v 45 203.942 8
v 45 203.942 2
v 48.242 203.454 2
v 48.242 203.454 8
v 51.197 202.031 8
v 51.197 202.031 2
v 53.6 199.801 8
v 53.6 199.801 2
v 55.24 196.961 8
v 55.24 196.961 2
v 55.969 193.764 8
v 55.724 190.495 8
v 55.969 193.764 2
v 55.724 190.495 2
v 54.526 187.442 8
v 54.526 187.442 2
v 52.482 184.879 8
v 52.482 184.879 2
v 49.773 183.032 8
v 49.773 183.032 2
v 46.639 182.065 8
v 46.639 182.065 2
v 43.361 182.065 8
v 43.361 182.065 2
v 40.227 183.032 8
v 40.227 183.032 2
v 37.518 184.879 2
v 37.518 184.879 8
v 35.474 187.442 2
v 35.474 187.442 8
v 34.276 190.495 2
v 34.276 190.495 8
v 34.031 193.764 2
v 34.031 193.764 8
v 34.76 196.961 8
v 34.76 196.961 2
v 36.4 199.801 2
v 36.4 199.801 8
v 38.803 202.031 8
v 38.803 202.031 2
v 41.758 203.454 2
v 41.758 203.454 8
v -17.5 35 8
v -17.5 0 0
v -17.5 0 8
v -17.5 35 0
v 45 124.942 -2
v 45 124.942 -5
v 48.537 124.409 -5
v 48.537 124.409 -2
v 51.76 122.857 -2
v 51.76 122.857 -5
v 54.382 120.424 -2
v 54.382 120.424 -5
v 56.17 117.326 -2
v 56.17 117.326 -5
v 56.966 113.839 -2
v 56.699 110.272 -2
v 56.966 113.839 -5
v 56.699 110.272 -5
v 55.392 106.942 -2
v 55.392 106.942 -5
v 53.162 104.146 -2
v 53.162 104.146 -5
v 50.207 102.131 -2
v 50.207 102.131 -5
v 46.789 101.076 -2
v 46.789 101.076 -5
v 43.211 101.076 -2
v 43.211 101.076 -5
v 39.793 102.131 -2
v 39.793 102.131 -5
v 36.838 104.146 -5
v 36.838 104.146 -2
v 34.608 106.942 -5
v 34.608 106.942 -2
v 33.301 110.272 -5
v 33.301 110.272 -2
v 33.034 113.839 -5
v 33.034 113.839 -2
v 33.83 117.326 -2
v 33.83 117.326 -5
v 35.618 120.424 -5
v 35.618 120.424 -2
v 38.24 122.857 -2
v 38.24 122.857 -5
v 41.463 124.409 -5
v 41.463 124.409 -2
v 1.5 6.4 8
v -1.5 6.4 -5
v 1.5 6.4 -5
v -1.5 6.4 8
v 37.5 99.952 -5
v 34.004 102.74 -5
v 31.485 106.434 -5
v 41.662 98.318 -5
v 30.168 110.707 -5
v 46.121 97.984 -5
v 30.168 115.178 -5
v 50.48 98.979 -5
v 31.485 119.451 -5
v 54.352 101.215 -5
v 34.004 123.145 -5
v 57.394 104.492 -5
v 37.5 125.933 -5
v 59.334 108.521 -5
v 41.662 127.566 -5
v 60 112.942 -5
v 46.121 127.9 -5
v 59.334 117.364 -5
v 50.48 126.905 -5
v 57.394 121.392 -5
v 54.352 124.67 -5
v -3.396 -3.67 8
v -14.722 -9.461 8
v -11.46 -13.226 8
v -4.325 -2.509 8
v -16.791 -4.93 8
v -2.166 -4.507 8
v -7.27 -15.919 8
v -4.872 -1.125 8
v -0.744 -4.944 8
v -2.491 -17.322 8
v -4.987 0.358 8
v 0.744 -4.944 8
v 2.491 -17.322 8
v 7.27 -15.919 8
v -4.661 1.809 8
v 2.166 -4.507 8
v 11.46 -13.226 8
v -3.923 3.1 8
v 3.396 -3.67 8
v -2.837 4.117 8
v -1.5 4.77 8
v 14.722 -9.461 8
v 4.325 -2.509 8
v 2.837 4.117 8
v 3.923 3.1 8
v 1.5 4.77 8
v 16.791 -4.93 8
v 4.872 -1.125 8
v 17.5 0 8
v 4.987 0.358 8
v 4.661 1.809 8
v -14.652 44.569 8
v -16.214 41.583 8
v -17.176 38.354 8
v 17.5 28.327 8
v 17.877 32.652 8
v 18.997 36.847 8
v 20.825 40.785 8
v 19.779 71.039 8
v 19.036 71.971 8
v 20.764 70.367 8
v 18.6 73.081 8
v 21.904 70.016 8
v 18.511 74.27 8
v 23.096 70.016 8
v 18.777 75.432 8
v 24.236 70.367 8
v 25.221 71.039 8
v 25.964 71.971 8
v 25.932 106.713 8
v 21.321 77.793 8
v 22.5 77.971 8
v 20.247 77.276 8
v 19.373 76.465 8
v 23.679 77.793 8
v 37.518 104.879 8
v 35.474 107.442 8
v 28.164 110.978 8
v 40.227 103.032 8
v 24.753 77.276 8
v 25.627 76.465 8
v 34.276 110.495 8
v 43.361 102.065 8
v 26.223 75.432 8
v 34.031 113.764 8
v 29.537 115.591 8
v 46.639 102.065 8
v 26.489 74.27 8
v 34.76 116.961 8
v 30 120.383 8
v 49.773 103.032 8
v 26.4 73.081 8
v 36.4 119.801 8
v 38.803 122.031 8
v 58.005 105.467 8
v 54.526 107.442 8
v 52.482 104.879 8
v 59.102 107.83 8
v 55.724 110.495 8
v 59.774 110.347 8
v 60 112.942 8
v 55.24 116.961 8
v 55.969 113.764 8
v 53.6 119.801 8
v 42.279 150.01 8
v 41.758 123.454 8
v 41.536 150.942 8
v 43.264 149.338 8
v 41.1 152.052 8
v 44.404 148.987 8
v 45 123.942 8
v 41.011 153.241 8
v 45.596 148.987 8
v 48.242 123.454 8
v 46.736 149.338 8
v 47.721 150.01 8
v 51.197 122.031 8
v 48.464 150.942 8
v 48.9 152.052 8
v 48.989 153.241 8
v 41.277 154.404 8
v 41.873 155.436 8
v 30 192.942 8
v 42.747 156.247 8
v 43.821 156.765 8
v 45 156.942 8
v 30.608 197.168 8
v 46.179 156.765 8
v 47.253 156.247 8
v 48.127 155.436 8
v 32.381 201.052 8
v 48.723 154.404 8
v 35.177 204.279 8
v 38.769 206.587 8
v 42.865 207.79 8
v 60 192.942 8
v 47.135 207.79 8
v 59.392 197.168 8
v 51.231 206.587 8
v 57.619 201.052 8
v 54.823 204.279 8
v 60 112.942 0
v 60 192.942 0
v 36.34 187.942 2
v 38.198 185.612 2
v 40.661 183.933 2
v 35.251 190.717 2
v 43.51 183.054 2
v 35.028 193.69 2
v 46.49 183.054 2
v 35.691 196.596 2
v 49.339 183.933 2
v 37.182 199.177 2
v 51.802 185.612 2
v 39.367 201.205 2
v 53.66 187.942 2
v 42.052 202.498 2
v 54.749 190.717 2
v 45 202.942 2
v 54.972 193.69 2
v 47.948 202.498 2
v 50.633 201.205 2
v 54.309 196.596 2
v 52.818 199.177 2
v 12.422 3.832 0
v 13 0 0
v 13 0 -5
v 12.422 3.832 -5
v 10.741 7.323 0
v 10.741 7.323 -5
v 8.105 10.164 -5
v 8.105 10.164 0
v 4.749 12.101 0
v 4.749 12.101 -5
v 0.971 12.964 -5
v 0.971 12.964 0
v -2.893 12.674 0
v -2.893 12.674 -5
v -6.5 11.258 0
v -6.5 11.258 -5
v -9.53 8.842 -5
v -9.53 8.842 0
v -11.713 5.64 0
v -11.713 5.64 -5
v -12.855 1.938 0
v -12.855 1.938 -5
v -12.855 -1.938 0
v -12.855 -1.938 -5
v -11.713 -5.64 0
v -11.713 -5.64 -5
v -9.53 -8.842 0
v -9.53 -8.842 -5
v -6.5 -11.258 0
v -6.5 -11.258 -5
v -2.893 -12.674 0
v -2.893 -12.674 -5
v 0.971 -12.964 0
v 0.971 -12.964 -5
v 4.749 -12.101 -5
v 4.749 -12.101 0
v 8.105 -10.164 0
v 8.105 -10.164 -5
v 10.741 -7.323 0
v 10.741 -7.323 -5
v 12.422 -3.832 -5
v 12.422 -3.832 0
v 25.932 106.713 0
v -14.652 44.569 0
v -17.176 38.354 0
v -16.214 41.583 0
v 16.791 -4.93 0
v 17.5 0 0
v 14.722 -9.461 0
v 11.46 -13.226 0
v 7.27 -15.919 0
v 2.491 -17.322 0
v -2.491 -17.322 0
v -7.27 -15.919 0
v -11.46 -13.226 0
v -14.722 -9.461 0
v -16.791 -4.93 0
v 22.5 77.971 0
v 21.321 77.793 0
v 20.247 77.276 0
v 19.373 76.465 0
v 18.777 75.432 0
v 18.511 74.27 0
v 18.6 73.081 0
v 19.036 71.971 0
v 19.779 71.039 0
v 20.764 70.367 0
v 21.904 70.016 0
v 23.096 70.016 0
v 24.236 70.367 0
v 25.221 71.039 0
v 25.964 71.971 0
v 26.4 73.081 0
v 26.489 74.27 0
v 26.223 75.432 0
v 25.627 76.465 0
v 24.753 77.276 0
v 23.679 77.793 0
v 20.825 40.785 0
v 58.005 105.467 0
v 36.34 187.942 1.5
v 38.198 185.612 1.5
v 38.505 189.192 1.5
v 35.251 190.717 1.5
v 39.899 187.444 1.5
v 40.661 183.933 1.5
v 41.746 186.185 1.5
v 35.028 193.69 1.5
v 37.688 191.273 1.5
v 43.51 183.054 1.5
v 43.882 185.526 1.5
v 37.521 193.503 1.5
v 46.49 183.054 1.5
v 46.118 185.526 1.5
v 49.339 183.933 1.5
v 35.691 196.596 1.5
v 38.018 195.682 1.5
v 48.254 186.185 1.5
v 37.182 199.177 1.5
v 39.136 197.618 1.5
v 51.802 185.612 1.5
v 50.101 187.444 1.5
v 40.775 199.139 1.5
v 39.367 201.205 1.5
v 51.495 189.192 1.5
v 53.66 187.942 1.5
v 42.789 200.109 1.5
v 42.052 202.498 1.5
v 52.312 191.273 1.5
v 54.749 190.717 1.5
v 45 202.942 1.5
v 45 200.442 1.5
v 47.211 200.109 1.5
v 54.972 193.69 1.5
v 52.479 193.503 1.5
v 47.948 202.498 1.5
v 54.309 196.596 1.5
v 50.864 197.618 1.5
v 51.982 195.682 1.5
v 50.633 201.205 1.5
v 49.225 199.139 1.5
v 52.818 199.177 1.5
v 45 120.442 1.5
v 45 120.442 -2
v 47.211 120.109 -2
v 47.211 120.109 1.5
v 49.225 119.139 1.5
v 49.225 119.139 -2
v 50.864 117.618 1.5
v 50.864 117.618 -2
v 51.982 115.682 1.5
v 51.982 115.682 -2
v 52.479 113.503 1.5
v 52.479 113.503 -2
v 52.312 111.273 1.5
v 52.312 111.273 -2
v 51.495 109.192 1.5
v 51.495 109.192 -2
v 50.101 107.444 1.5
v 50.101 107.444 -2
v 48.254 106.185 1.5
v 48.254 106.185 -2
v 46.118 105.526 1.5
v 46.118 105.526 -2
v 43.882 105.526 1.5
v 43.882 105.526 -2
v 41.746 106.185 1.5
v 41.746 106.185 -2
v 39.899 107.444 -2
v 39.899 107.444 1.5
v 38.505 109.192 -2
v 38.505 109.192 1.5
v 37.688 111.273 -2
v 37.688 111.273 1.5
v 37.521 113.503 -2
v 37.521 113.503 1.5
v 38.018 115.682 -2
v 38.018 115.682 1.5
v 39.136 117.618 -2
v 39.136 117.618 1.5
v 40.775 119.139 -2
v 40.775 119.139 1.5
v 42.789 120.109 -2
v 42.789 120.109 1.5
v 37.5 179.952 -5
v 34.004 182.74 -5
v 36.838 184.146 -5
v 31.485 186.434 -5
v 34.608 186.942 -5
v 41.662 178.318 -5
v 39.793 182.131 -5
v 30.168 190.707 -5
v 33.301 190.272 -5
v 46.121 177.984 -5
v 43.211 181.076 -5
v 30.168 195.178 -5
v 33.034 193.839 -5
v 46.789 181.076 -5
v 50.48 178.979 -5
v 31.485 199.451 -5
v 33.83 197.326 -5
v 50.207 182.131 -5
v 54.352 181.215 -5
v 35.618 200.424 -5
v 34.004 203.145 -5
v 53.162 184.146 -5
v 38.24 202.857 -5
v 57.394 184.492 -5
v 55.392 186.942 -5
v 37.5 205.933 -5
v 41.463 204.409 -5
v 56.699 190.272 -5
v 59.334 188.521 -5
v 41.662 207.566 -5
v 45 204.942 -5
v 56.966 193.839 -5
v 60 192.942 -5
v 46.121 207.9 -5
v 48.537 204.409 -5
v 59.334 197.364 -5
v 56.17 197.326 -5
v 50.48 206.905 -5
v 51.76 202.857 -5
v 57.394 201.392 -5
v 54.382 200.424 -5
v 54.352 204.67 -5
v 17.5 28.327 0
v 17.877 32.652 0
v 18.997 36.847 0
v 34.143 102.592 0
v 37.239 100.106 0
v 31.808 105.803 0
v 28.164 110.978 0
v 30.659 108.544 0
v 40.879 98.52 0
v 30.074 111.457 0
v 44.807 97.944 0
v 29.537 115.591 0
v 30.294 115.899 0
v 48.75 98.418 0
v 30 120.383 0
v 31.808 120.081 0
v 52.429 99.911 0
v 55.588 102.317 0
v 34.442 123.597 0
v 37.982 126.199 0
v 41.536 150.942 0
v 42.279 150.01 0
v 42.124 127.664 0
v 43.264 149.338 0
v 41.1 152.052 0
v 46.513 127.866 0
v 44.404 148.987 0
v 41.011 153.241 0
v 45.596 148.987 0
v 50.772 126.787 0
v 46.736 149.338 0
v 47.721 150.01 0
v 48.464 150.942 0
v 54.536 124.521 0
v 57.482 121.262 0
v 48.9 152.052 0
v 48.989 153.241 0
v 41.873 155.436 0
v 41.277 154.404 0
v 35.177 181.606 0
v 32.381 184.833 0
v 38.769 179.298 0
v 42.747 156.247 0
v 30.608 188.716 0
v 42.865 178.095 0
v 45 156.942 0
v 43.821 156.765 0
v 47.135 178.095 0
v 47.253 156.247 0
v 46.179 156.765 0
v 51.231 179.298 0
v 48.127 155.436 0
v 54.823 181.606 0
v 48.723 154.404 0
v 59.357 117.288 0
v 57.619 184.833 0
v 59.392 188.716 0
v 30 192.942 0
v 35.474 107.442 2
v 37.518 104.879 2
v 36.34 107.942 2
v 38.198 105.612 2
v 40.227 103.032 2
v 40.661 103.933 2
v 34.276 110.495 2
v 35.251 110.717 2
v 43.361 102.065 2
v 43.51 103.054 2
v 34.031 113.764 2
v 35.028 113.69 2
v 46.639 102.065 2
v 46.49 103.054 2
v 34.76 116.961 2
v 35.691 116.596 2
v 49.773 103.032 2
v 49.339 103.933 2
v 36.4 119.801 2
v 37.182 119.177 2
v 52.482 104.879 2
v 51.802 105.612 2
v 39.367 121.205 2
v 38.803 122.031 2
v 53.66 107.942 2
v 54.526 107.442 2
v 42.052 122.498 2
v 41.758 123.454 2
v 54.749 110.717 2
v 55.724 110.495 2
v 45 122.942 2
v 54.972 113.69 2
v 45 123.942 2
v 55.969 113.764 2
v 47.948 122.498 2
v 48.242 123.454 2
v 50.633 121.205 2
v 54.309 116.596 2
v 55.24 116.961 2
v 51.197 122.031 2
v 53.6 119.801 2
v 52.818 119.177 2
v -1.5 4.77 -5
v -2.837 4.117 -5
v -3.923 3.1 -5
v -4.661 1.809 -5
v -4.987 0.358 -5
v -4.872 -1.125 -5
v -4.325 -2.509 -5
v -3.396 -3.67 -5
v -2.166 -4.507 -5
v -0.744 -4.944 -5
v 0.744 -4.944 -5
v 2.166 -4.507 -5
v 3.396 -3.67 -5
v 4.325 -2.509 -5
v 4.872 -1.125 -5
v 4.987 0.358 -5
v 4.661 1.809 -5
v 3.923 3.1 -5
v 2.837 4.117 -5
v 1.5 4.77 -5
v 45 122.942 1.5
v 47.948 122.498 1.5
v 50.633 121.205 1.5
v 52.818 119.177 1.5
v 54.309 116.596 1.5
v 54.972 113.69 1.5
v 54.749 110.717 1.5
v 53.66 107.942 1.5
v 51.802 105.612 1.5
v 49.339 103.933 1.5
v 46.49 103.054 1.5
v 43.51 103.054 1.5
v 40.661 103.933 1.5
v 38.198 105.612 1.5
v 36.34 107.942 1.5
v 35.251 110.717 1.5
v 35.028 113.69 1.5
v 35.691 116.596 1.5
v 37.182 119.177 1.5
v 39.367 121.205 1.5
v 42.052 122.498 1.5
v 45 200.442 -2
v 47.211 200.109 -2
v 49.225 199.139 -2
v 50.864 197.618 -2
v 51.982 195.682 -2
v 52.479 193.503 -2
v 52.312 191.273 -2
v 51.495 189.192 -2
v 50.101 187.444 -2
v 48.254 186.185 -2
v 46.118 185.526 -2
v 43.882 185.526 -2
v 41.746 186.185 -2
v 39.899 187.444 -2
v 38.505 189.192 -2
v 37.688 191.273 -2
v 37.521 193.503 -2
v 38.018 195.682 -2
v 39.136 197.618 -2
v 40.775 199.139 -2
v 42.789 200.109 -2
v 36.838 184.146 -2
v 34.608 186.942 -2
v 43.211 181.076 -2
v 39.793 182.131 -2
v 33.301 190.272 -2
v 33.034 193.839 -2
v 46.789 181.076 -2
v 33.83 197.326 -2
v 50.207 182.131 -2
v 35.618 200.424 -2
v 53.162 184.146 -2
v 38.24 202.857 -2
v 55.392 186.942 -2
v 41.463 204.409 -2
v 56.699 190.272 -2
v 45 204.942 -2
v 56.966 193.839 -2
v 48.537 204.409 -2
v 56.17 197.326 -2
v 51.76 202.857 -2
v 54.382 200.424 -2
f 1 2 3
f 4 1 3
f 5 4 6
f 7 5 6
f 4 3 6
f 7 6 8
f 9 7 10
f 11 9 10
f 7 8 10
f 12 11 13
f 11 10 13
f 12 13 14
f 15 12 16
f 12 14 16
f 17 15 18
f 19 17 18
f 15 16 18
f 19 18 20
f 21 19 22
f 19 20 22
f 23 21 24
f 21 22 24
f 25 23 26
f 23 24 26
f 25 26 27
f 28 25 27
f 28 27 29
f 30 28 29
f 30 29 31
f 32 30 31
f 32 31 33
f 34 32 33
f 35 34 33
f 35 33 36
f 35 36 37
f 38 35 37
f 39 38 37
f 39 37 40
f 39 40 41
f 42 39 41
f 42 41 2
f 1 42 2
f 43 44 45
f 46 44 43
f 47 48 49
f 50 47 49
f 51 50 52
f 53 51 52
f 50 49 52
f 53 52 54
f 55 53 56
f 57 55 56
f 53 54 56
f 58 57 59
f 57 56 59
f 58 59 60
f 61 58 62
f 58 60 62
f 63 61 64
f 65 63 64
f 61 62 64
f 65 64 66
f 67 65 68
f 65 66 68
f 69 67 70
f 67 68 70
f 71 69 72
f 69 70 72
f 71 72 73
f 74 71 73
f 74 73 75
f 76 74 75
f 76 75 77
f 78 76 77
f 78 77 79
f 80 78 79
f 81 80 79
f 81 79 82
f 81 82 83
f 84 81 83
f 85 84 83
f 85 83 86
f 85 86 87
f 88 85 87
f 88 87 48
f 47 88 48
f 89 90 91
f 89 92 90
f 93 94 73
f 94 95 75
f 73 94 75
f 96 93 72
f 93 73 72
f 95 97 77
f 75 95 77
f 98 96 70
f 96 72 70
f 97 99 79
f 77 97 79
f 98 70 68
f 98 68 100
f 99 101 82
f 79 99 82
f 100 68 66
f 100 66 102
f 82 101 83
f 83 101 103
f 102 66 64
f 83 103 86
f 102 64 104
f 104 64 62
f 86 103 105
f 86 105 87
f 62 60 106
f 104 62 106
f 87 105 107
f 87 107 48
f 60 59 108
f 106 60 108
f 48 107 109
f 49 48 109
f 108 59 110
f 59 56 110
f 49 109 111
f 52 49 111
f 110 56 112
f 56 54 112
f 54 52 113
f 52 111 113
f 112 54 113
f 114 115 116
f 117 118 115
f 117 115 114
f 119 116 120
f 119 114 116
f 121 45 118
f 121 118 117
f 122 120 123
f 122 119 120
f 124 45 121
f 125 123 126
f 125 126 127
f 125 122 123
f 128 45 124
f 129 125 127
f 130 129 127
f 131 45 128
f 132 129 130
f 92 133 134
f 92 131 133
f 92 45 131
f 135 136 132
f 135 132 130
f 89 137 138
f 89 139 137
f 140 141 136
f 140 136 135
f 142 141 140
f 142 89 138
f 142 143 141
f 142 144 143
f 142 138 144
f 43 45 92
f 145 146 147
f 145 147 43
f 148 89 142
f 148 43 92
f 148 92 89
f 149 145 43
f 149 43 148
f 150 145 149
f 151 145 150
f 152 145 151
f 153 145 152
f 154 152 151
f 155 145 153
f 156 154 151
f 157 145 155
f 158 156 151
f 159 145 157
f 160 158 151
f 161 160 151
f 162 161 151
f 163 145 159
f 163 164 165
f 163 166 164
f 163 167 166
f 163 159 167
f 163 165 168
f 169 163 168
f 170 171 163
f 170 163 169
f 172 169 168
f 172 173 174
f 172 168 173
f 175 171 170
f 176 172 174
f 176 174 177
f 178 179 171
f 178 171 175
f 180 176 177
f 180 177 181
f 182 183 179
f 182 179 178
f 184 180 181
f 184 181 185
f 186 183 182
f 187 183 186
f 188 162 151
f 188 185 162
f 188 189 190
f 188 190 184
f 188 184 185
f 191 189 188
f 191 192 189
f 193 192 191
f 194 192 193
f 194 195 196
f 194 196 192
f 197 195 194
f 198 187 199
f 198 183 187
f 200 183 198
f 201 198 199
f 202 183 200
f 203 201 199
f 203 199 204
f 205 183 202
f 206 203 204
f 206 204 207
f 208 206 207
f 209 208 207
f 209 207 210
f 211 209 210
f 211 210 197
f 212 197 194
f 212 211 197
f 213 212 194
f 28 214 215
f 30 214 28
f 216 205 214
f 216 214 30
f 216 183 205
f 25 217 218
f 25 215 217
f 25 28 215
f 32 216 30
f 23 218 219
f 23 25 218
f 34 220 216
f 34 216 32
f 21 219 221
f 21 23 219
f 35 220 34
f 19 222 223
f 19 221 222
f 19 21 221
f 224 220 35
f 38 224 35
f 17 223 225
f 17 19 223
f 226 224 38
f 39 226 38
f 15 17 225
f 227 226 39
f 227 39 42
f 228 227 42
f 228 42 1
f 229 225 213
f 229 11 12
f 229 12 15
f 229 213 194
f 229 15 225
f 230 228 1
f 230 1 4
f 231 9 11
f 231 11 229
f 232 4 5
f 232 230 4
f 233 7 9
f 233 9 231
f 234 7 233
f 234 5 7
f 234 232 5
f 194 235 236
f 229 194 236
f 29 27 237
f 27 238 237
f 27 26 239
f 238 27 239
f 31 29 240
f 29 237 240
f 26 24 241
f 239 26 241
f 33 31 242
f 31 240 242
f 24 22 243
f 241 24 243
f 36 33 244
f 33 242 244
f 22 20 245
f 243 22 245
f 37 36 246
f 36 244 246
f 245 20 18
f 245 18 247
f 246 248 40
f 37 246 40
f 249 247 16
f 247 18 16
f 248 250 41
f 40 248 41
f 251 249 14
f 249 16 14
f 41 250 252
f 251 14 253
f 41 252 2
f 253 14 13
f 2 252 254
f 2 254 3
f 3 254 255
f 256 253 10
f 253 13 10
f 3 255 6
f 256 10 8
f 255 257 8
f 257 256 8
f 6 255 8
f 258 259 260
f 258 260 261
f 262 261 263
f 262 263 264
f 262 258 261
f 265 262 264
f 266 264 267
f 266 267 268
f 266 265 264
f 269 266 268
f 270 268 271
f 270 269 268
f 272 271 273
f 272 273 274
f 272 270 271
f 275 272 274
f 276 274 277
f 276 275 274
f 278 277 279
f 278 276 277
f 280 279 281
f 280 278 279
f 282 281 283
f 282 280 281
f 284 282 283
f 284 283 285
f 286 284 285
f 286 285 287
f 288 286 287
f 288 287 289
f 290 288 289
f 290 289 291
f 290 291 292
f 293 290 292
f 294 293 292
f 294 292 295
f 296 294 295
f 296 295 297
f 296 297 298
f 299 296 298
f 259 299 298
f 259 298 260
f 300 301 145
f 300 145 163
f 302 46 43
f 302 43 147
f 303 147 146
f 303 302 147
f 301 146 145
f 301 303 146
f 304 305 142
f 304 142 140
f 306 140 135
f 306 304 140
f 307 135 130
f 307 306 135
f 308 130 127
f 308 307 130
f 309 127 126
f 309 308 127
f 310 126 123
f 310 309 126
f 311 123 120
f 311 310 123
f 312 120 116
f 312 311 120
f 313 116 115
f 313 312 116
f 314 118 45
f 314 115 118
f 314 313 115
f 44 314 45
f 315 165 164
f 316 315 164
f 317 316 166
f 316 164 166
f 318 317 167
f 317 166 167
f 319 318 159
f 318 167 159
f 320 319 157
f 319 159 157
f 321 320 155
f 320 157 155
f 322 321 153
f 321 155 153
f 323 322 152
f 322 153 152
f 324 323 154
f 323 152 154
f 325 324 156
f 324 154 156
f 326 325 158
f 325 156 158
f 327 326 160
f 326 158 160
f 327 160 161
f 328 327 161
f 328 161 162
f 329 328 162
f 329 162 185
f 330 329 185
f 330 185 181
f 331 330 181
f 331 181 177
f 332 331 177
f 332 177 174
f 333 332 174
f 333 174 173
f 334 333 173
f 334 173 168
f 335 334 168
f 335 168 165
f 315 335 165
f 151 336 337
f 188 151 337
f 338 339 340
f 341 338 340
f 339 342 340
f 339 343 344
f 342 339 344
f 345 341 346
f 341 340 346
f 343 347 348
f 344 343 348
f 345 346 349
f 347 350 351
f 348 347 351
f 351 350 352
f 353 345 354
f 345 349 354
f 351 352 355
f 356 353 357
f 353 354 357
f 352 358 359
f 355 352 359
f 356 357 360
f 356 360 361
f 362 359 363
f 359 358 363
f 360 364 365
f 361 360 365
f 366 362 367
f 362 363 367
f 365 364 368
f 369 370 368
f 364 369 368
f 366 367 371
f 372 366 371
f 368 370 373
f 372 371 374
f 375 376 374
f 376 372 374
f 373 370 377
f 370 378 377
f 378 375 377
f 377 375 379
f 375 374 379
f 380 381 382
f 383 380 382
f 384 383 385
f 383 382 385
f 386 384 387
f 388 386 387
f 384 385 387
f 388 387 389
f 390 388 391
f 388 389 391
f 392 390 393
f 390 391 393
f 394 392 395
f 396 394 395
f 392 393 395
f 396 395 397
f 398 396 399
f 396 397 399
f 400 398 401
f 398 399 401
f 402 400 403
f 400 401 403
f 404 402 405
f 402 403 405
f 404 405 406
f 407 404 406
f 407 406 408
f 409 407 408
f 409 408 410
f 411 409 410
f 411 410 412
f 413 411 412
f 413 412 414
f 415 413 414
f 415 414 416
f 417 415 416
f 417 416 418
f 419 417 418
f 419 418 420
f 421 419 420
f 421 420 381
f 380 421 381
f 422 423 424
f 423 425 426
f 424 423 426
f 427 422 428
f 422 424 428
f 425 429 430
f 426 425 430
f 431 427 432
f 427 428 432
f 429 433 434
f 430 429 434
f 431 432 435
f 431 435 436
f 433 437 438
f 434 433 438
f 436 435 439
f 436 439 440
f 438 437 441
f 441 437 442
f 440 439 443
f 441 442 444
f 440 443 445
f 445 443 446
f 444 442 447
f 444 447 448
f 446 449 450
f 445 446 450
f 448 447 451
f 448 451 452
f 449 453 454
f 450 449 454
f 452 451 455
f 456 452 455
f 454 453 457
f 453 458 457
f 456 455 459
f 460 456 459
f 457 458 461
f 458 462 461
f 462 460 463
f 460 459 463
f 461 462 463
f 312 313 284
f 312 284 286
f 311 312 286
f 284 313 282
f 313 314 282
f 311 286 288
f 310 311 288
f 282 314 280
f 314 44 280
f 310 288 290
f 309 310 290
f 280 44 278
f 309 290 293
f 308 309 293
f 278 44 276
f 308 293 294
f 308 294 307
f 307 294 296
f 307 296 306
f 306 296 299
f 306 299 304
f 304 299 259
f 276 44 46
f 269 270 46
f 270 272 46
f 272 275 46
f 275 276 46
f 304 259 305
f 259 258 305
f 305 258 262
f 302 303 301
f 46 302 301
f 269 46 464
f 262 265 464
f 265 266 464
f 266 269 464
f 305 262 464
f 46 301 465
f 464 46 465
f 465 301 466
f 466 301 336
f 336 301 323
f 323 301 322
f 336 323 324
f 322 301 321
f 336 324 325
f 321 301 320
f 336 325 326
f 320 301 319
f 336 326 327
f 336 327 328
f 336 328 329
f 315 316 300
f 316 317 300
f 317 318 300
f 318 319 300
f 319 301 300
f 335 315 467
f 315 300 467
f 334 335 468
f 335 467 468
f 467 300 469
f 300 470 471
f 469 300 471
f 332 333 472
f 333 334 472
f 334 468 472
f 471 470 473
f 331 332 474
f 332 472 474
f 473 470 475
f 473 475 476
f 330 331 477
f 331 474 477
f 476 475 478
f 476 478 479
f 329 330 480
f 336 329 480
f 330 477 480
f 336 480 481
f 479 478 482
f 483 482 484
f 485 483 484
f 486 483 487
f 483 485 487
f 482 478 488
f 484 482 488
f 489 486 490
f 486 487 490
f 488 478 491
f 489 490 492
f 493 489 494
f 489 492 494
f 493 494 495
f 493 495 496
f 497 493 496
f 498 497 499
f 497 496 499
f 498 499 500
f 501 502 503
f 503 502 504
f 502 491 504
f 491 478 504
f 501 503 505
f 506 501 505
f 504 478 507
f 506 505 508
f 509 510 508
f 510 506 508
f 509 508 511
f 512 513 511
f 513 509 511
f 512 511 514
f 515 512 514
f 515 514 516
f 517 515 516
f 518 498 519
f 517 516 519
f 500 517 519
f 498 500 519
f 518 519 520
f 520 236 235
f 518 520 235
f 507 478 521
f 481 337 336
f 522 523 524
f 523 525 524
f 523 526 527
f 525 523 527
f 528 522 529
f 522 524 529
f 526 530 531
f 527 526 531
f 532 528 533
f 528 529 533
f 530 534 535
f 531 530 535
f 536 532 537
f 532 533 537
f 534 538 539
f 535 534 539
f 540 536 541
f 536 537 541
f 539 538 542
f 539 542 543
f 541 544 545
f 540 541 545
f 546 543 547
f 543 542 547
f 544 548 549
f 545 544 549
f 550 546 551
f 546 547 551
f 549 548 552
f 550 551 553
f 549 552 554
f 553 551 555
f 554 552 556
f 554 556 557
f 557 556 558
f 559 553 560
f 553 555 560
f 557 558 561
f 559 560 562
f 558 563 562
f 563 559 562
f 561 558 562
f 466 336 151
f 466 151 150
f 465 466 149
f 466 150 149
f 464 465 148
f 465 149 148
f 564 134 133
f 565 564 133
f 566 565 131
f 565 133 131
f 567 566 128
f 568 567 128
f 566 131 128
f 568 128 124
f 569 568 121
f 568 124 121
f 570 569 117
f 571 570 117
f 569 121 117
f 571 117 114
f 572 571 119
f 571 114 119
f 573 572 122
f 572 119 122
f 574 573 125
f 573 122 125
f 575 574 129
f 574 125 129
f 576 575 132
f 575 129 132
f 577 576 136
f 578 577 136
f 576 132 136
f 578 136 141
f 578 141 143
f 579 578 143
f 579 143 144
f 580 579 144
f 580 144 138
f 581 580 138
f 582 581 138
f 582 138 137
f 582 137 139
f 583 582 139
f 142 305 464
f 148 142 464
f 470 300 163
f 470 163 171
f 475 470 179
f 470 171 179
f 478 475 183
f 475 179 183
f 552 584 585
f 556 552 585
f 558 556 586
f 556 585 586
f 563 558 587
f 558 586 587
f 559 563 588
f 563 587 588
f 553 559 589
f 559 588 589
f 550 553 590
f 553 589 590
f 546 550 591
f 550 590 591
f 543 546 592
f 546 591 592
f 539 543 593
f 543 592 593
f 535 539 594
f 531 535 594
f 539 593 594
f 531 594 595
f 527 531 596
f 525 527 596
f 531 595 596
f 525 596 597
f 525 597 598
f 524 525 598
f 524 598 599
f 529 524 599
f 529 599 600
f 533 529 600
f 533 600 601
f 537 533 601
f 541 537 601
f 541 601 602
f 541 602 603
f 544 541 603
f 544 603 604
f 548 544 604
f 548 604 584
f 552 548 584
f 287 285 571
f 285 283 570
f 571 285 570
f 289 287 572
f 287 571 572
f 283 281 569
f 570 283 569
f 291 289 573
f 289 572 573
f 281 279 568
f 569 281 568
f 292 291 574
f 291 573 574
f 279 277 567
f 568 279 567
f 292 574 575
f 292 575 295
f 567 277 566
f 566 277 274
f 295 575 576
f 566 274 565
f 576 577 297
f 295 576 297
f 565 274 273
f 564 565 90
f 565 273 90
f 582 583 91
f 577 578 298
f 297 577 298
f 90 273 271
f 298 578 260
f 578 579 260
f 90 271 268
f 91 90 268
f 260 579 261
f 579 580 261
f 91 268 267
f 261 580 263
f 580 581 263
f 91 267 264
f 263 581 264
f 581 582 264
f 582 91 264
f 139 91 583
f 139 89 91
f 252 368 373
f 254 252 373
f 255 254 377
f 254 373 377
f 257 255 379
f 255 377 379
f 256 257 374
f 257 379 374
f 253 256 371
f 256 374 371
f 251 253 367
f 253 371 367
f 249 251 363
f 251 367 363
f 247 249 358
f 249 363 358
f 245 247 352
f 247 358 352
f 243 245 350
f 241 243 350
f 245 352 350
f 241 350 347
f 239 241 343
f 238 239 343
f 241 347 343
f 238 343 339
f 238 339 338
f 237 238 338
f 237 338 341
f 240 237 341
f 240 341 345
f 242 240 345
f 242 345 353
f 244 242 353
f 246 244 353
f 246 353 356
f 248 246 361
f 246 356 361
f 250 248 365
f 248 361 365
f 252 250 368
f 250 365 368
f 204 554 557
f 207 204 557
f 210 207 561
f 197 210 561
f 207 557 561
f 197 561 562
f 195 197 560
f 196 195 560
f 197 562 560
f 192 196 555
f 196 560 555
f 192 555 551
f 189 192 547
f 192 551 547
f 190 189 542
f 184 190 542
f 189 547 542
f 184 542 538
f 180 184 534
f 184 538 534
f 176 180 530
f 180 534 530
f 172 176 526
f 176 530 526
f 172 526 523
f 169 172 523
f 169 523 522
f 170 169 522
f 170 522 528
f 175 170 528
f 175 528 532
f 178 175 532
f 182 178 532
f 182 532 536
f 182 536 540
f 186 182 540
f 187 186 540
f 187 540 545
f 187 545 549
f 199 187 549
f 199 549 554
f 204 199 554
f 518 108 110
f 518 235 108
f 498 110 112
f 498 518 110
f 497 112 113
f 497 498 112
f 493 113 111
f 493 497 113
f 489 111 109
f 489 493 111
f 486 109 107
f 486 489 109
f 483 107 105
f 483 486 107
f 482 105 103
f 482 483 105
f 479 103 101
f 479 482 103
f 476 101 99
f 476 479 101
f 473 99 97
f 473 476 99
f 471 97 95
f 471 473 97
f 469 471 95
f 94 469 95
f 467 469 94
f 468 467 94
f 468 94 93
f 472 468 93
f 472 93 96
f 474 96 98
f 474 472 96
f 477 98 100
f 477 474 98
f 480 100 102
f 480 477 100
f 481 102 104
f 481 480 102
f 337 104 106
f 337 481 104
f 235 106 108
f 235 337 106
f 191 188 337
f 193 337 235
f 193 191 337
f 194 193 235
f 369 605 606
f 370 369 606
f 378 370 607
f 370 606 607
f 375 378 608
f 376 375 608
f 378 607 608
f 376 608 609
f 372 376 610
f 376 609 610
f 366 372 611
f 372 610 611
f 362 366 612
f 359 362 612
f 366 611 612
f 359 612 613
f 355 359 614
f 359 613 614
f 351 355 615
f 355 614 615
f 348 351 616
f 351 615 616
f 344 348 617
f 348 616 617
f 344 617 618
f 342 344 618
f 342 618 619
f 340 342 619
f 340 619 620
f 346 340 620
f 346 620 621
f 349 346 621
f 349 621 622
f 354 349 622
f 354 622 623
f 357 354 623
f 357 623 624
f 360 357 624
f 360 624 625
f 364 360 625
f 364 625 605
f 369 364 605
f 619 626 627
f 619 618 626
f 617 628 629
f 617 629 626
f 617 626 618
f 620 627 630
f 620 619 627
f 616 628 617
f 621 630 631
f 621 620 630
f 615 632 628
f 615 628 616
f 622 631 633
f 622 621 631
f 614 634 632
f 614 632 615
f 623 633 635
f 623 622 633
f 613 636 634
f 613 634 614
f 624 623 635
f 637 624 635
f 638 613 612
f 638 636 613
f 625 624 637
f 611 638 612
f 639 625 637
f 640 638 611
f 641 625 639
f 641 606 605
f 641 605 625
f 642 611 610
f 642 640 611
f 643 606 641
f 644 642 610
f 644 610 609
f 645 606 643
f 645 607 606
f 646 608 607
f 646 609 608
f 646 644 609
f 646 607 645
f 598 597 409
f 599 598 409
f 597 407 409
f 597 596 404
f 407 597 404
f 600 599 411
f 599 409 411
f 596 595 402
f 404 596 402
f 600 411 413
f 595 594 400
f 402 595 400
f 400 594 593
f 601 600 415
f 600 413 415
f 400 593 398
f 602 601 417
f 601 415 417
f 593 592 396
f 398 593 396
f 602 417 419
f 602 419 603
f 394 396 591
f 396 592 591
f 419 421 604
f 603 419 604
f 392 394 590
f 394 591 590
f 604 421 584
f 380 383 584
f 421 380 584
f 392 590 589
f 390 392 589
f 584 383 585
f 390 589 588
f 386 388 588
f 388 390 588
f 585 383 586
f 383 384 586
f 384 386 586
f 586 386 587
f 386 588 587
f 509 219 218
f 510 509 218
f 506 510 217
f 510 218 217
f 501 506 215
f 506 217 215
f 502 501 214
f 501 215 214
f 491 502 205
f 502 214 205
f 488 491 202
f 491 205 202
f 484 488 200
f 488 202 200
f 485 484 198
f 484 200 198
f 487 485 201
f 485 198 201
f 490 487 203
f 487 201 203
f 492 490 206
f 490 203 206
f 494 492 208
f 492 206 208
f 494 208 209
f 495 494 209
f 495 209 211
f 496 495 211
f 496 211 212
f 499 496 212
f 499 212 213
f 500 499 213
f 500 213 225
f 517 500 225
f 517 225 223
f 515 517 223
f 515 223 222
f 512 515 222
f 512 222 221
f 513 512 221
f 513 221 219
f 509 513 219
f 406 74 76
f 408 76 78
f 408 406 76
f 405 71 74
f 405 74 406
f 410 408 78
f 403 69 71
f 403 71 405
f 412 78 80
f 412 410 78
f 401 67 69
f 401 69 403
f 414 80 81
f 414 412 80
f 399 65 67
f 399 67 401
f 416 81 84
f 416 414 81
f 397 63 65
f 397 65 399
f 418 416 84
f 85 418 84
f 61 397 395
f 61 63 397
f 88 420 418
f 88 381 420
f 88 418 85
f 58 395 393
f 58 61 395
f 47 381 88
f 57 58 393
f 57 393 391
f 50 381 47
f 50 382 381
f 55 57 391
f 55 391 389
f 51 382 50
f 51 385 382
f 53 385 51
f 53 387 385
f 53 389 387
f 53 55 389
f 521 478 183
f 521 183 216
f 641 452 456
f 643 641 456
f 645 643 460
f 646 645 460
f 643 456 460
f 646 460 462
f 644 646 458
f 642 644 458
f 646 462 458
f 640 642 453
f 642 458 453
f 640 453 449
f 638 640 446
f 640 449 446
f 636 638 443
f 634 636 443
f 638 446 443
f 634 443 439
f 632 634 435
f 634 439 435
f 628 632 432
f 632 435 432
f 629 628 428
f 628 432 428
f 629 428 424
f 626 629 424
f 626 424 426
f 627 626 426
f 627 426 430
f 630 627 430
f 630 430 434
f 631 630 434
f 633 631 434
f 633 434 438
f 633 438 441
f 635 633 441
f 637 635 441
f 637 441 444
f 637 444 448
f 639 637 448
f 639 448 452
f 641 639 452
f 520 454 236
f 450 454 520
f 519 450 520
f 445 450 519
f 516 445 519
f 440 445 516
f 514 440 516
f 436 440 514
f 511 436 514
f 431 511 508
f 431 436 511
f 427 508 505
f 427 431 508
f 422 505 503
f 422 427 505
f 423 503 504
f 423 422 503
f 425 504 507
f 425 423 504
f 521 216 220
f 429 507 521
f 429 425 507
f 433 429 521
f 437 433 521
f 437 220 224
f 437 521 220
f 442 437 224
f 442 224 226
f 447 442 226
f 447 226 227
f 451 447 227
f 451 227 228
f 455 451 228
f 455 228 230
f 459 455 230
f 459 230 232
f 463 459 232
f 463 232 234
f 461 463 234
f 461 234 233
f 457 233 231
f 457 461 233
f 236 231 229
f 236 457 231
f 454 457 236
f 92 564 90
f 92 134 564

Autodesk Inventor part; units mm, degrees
ref_plane "YZ Plane" through (0, 0, 0) normal (1, 0, 0) x (0, 1, 0)
ref_plane "XZ Plane" through (0, 0, 0) normal (0, 1, 0) x (-1, 0, 0)
ref_plane "XY Plane" through (0, 0, 0) normal (0, 0, 1) x (1, 0, 0)
sketch "Skizze1" plane through (0, 0, 0) normal (0, 0, 1) x (1, 0, 0)
  arc A0 (-1.5, 4.7697) -> (1.5, 4.7697) centre (0, 0) ccw
  circle A1 centre (0, 0) radius 13
  line L0 (-33.9343, 0) -> (76.2277, 0) construction
  circle A2 centre (0, 0) radius 17.5
  circle A3 centre (45, 112.9423) radius 15
  line L1 (60, 112.9423) -> (60, 192.9423)
  line L2 (30, 112.9423) -> (30, 192.9423)
  line L3 (45, 112.9423) -> (45, 207.9423) construction
  line L4 (45, 112.9423) -> (45, 127.9423) construction
  line L5 (30, 112.9423) -> (60, 112.9423) construction
  line L6 (-17.5, 0) -> (-17.5, 35)
  line L7 (17.5, 0) -> (17.5, 35)
  line L8 (-17.5, 35) -> (17.5, 35) construction
  circle A4 centre (0, 35) radius 17.5 construction
  line L9 (-14.6522, 44.5688) -> (30, 112.9423)
  arc A5 (-14.6522, 44.5688) -> (-17.5, 35) centre (0, 35) ccw
  line L10 (17.5, 35) -> (58.0047, 105.4671)
  arc A6 (58.0047, 105.4671) -> (60, 112.9423) centre (45, 112.9423) ccw
  line L11 (0, 35) -> (45, 112.9423) construction
  circle A7 centre (45, 192.9423) radius 15
  circle A8 centre (45, 192.9423) radius 5
  circle A9 centre (45, 112.9423) radius 5
  line L12 (-1.5, 6.4) -> (1.5, 6.4)
  line L13 (1.5, 6.4) -> (1.5, 4.7697)
  line L14 (-1.5, 4.7697) -> (-1.5, 6.4)
  line L15 (0, 0) -> (0, 5) construction
  line L16 (0, 5) -> (1.5, 5) construction
  point P0 (22.5, 73.9711)
  point P1 (45, 152.9423)
  point P2 (-13, 0)
  point P3 (13, 0)
  point P4 (0, 6.4)
  dimension "d0" = 10
  dimension "d1" = 26
  dimension "d4" = 35
  dimension "d36" = 0
  dimension "d37" = 30
  dimension "d38" = 60
  dimension "d39" = 35
  dimension "d40" = 90
  dimension "d41" = 80
  dimension "d42" = 45
  dimension "d43" = 10
  dimension "d44" = 10
  dimension "d45" = 40
  dimension "d51" = 3
  dimension "d52" = 1.4
extrude "Extrusion1" add sketch "Skizze1" against normal blind 5 contours A1 | A3 | A7
extrude "Extrusion2" add sketch "Skizze1" along normal blind 8 contours A1 | A2 | A2 L6 A5 L9 A3 L10 L7 | A3 | L2 A7 L1 A3 | A7
fillet "Rundung1" radius 25 2 edges at (30, 112.9423, 4) (17.5, 35, 4)
hole "Bohrung2" at (45, 152.9423, 0) at (22.5, 73.9711, 0) direction (0, 0, 1) diameter 8 end through all
ref_plane "Arbeitsebene1" through (45, 112.9423, 0) normal (1, 0, 0) x (0, 0, -1)
sketch "Skizze3" plane through (45, 112.9423, 0) normal (1, 0, 0) x (0, 0, -1)
  line L0 (-10.6, 0) -> (7.6, 0) construction
  line L1 (-10.6, 80) -> (7.6, 80) construction
  line L2 (-8, 91) -> (-2, 91)
  line L3 (-2, 91) -> (-2, 90)
  line L4 (-2, 90) -> (-1.5, 90)
  line L5 (-1.5, 90) -> (-1.5, 87.5)
  line L6 (-1.5, 87.5) -> (2, 87.5)
  line L7 (-8, 75) -> (-8, 85) construction
  line L8 (5, 85) -> (-8, 85) construction
  line L9 (5, 75) -> (-8, 75) construction
  line L10 (5, 85) -> (5, 75) construction
  line L11 (0, 0) -> (0, 80) construction
  line L12 (2, 87.5) -> (2, 92)
  line L13 (2, 92) -> (5, 92)
  line L14 (-8, 91) -> (-8, 85)
  line L15 (5, 92) -> (5, 85)
  line L16 (-8, 85) -> (5, 85)
  point P0 (0, -112.9423)
  dimension "d53" = 6
  dimension "d54" = 22
  dimension "d55" = 20
  dimension "d56" = 15
  dimension "d57" = 24
  dimension "d58" = 3
  dimension "d59" = 0.5
revolve "Umdrehung1" cut sketch "Skizze3" angle 360 about axis through (45, 192.9423, 0) along (0, 0, -1)
pattern_linear "Rechteckige Anordnung1" count 2 spacing 80 along (0, -1, 0) of "Umdrehung1"
properties part number "ParallelSystem_ProximalPart_Driven_v2" material "Edelstahl"
